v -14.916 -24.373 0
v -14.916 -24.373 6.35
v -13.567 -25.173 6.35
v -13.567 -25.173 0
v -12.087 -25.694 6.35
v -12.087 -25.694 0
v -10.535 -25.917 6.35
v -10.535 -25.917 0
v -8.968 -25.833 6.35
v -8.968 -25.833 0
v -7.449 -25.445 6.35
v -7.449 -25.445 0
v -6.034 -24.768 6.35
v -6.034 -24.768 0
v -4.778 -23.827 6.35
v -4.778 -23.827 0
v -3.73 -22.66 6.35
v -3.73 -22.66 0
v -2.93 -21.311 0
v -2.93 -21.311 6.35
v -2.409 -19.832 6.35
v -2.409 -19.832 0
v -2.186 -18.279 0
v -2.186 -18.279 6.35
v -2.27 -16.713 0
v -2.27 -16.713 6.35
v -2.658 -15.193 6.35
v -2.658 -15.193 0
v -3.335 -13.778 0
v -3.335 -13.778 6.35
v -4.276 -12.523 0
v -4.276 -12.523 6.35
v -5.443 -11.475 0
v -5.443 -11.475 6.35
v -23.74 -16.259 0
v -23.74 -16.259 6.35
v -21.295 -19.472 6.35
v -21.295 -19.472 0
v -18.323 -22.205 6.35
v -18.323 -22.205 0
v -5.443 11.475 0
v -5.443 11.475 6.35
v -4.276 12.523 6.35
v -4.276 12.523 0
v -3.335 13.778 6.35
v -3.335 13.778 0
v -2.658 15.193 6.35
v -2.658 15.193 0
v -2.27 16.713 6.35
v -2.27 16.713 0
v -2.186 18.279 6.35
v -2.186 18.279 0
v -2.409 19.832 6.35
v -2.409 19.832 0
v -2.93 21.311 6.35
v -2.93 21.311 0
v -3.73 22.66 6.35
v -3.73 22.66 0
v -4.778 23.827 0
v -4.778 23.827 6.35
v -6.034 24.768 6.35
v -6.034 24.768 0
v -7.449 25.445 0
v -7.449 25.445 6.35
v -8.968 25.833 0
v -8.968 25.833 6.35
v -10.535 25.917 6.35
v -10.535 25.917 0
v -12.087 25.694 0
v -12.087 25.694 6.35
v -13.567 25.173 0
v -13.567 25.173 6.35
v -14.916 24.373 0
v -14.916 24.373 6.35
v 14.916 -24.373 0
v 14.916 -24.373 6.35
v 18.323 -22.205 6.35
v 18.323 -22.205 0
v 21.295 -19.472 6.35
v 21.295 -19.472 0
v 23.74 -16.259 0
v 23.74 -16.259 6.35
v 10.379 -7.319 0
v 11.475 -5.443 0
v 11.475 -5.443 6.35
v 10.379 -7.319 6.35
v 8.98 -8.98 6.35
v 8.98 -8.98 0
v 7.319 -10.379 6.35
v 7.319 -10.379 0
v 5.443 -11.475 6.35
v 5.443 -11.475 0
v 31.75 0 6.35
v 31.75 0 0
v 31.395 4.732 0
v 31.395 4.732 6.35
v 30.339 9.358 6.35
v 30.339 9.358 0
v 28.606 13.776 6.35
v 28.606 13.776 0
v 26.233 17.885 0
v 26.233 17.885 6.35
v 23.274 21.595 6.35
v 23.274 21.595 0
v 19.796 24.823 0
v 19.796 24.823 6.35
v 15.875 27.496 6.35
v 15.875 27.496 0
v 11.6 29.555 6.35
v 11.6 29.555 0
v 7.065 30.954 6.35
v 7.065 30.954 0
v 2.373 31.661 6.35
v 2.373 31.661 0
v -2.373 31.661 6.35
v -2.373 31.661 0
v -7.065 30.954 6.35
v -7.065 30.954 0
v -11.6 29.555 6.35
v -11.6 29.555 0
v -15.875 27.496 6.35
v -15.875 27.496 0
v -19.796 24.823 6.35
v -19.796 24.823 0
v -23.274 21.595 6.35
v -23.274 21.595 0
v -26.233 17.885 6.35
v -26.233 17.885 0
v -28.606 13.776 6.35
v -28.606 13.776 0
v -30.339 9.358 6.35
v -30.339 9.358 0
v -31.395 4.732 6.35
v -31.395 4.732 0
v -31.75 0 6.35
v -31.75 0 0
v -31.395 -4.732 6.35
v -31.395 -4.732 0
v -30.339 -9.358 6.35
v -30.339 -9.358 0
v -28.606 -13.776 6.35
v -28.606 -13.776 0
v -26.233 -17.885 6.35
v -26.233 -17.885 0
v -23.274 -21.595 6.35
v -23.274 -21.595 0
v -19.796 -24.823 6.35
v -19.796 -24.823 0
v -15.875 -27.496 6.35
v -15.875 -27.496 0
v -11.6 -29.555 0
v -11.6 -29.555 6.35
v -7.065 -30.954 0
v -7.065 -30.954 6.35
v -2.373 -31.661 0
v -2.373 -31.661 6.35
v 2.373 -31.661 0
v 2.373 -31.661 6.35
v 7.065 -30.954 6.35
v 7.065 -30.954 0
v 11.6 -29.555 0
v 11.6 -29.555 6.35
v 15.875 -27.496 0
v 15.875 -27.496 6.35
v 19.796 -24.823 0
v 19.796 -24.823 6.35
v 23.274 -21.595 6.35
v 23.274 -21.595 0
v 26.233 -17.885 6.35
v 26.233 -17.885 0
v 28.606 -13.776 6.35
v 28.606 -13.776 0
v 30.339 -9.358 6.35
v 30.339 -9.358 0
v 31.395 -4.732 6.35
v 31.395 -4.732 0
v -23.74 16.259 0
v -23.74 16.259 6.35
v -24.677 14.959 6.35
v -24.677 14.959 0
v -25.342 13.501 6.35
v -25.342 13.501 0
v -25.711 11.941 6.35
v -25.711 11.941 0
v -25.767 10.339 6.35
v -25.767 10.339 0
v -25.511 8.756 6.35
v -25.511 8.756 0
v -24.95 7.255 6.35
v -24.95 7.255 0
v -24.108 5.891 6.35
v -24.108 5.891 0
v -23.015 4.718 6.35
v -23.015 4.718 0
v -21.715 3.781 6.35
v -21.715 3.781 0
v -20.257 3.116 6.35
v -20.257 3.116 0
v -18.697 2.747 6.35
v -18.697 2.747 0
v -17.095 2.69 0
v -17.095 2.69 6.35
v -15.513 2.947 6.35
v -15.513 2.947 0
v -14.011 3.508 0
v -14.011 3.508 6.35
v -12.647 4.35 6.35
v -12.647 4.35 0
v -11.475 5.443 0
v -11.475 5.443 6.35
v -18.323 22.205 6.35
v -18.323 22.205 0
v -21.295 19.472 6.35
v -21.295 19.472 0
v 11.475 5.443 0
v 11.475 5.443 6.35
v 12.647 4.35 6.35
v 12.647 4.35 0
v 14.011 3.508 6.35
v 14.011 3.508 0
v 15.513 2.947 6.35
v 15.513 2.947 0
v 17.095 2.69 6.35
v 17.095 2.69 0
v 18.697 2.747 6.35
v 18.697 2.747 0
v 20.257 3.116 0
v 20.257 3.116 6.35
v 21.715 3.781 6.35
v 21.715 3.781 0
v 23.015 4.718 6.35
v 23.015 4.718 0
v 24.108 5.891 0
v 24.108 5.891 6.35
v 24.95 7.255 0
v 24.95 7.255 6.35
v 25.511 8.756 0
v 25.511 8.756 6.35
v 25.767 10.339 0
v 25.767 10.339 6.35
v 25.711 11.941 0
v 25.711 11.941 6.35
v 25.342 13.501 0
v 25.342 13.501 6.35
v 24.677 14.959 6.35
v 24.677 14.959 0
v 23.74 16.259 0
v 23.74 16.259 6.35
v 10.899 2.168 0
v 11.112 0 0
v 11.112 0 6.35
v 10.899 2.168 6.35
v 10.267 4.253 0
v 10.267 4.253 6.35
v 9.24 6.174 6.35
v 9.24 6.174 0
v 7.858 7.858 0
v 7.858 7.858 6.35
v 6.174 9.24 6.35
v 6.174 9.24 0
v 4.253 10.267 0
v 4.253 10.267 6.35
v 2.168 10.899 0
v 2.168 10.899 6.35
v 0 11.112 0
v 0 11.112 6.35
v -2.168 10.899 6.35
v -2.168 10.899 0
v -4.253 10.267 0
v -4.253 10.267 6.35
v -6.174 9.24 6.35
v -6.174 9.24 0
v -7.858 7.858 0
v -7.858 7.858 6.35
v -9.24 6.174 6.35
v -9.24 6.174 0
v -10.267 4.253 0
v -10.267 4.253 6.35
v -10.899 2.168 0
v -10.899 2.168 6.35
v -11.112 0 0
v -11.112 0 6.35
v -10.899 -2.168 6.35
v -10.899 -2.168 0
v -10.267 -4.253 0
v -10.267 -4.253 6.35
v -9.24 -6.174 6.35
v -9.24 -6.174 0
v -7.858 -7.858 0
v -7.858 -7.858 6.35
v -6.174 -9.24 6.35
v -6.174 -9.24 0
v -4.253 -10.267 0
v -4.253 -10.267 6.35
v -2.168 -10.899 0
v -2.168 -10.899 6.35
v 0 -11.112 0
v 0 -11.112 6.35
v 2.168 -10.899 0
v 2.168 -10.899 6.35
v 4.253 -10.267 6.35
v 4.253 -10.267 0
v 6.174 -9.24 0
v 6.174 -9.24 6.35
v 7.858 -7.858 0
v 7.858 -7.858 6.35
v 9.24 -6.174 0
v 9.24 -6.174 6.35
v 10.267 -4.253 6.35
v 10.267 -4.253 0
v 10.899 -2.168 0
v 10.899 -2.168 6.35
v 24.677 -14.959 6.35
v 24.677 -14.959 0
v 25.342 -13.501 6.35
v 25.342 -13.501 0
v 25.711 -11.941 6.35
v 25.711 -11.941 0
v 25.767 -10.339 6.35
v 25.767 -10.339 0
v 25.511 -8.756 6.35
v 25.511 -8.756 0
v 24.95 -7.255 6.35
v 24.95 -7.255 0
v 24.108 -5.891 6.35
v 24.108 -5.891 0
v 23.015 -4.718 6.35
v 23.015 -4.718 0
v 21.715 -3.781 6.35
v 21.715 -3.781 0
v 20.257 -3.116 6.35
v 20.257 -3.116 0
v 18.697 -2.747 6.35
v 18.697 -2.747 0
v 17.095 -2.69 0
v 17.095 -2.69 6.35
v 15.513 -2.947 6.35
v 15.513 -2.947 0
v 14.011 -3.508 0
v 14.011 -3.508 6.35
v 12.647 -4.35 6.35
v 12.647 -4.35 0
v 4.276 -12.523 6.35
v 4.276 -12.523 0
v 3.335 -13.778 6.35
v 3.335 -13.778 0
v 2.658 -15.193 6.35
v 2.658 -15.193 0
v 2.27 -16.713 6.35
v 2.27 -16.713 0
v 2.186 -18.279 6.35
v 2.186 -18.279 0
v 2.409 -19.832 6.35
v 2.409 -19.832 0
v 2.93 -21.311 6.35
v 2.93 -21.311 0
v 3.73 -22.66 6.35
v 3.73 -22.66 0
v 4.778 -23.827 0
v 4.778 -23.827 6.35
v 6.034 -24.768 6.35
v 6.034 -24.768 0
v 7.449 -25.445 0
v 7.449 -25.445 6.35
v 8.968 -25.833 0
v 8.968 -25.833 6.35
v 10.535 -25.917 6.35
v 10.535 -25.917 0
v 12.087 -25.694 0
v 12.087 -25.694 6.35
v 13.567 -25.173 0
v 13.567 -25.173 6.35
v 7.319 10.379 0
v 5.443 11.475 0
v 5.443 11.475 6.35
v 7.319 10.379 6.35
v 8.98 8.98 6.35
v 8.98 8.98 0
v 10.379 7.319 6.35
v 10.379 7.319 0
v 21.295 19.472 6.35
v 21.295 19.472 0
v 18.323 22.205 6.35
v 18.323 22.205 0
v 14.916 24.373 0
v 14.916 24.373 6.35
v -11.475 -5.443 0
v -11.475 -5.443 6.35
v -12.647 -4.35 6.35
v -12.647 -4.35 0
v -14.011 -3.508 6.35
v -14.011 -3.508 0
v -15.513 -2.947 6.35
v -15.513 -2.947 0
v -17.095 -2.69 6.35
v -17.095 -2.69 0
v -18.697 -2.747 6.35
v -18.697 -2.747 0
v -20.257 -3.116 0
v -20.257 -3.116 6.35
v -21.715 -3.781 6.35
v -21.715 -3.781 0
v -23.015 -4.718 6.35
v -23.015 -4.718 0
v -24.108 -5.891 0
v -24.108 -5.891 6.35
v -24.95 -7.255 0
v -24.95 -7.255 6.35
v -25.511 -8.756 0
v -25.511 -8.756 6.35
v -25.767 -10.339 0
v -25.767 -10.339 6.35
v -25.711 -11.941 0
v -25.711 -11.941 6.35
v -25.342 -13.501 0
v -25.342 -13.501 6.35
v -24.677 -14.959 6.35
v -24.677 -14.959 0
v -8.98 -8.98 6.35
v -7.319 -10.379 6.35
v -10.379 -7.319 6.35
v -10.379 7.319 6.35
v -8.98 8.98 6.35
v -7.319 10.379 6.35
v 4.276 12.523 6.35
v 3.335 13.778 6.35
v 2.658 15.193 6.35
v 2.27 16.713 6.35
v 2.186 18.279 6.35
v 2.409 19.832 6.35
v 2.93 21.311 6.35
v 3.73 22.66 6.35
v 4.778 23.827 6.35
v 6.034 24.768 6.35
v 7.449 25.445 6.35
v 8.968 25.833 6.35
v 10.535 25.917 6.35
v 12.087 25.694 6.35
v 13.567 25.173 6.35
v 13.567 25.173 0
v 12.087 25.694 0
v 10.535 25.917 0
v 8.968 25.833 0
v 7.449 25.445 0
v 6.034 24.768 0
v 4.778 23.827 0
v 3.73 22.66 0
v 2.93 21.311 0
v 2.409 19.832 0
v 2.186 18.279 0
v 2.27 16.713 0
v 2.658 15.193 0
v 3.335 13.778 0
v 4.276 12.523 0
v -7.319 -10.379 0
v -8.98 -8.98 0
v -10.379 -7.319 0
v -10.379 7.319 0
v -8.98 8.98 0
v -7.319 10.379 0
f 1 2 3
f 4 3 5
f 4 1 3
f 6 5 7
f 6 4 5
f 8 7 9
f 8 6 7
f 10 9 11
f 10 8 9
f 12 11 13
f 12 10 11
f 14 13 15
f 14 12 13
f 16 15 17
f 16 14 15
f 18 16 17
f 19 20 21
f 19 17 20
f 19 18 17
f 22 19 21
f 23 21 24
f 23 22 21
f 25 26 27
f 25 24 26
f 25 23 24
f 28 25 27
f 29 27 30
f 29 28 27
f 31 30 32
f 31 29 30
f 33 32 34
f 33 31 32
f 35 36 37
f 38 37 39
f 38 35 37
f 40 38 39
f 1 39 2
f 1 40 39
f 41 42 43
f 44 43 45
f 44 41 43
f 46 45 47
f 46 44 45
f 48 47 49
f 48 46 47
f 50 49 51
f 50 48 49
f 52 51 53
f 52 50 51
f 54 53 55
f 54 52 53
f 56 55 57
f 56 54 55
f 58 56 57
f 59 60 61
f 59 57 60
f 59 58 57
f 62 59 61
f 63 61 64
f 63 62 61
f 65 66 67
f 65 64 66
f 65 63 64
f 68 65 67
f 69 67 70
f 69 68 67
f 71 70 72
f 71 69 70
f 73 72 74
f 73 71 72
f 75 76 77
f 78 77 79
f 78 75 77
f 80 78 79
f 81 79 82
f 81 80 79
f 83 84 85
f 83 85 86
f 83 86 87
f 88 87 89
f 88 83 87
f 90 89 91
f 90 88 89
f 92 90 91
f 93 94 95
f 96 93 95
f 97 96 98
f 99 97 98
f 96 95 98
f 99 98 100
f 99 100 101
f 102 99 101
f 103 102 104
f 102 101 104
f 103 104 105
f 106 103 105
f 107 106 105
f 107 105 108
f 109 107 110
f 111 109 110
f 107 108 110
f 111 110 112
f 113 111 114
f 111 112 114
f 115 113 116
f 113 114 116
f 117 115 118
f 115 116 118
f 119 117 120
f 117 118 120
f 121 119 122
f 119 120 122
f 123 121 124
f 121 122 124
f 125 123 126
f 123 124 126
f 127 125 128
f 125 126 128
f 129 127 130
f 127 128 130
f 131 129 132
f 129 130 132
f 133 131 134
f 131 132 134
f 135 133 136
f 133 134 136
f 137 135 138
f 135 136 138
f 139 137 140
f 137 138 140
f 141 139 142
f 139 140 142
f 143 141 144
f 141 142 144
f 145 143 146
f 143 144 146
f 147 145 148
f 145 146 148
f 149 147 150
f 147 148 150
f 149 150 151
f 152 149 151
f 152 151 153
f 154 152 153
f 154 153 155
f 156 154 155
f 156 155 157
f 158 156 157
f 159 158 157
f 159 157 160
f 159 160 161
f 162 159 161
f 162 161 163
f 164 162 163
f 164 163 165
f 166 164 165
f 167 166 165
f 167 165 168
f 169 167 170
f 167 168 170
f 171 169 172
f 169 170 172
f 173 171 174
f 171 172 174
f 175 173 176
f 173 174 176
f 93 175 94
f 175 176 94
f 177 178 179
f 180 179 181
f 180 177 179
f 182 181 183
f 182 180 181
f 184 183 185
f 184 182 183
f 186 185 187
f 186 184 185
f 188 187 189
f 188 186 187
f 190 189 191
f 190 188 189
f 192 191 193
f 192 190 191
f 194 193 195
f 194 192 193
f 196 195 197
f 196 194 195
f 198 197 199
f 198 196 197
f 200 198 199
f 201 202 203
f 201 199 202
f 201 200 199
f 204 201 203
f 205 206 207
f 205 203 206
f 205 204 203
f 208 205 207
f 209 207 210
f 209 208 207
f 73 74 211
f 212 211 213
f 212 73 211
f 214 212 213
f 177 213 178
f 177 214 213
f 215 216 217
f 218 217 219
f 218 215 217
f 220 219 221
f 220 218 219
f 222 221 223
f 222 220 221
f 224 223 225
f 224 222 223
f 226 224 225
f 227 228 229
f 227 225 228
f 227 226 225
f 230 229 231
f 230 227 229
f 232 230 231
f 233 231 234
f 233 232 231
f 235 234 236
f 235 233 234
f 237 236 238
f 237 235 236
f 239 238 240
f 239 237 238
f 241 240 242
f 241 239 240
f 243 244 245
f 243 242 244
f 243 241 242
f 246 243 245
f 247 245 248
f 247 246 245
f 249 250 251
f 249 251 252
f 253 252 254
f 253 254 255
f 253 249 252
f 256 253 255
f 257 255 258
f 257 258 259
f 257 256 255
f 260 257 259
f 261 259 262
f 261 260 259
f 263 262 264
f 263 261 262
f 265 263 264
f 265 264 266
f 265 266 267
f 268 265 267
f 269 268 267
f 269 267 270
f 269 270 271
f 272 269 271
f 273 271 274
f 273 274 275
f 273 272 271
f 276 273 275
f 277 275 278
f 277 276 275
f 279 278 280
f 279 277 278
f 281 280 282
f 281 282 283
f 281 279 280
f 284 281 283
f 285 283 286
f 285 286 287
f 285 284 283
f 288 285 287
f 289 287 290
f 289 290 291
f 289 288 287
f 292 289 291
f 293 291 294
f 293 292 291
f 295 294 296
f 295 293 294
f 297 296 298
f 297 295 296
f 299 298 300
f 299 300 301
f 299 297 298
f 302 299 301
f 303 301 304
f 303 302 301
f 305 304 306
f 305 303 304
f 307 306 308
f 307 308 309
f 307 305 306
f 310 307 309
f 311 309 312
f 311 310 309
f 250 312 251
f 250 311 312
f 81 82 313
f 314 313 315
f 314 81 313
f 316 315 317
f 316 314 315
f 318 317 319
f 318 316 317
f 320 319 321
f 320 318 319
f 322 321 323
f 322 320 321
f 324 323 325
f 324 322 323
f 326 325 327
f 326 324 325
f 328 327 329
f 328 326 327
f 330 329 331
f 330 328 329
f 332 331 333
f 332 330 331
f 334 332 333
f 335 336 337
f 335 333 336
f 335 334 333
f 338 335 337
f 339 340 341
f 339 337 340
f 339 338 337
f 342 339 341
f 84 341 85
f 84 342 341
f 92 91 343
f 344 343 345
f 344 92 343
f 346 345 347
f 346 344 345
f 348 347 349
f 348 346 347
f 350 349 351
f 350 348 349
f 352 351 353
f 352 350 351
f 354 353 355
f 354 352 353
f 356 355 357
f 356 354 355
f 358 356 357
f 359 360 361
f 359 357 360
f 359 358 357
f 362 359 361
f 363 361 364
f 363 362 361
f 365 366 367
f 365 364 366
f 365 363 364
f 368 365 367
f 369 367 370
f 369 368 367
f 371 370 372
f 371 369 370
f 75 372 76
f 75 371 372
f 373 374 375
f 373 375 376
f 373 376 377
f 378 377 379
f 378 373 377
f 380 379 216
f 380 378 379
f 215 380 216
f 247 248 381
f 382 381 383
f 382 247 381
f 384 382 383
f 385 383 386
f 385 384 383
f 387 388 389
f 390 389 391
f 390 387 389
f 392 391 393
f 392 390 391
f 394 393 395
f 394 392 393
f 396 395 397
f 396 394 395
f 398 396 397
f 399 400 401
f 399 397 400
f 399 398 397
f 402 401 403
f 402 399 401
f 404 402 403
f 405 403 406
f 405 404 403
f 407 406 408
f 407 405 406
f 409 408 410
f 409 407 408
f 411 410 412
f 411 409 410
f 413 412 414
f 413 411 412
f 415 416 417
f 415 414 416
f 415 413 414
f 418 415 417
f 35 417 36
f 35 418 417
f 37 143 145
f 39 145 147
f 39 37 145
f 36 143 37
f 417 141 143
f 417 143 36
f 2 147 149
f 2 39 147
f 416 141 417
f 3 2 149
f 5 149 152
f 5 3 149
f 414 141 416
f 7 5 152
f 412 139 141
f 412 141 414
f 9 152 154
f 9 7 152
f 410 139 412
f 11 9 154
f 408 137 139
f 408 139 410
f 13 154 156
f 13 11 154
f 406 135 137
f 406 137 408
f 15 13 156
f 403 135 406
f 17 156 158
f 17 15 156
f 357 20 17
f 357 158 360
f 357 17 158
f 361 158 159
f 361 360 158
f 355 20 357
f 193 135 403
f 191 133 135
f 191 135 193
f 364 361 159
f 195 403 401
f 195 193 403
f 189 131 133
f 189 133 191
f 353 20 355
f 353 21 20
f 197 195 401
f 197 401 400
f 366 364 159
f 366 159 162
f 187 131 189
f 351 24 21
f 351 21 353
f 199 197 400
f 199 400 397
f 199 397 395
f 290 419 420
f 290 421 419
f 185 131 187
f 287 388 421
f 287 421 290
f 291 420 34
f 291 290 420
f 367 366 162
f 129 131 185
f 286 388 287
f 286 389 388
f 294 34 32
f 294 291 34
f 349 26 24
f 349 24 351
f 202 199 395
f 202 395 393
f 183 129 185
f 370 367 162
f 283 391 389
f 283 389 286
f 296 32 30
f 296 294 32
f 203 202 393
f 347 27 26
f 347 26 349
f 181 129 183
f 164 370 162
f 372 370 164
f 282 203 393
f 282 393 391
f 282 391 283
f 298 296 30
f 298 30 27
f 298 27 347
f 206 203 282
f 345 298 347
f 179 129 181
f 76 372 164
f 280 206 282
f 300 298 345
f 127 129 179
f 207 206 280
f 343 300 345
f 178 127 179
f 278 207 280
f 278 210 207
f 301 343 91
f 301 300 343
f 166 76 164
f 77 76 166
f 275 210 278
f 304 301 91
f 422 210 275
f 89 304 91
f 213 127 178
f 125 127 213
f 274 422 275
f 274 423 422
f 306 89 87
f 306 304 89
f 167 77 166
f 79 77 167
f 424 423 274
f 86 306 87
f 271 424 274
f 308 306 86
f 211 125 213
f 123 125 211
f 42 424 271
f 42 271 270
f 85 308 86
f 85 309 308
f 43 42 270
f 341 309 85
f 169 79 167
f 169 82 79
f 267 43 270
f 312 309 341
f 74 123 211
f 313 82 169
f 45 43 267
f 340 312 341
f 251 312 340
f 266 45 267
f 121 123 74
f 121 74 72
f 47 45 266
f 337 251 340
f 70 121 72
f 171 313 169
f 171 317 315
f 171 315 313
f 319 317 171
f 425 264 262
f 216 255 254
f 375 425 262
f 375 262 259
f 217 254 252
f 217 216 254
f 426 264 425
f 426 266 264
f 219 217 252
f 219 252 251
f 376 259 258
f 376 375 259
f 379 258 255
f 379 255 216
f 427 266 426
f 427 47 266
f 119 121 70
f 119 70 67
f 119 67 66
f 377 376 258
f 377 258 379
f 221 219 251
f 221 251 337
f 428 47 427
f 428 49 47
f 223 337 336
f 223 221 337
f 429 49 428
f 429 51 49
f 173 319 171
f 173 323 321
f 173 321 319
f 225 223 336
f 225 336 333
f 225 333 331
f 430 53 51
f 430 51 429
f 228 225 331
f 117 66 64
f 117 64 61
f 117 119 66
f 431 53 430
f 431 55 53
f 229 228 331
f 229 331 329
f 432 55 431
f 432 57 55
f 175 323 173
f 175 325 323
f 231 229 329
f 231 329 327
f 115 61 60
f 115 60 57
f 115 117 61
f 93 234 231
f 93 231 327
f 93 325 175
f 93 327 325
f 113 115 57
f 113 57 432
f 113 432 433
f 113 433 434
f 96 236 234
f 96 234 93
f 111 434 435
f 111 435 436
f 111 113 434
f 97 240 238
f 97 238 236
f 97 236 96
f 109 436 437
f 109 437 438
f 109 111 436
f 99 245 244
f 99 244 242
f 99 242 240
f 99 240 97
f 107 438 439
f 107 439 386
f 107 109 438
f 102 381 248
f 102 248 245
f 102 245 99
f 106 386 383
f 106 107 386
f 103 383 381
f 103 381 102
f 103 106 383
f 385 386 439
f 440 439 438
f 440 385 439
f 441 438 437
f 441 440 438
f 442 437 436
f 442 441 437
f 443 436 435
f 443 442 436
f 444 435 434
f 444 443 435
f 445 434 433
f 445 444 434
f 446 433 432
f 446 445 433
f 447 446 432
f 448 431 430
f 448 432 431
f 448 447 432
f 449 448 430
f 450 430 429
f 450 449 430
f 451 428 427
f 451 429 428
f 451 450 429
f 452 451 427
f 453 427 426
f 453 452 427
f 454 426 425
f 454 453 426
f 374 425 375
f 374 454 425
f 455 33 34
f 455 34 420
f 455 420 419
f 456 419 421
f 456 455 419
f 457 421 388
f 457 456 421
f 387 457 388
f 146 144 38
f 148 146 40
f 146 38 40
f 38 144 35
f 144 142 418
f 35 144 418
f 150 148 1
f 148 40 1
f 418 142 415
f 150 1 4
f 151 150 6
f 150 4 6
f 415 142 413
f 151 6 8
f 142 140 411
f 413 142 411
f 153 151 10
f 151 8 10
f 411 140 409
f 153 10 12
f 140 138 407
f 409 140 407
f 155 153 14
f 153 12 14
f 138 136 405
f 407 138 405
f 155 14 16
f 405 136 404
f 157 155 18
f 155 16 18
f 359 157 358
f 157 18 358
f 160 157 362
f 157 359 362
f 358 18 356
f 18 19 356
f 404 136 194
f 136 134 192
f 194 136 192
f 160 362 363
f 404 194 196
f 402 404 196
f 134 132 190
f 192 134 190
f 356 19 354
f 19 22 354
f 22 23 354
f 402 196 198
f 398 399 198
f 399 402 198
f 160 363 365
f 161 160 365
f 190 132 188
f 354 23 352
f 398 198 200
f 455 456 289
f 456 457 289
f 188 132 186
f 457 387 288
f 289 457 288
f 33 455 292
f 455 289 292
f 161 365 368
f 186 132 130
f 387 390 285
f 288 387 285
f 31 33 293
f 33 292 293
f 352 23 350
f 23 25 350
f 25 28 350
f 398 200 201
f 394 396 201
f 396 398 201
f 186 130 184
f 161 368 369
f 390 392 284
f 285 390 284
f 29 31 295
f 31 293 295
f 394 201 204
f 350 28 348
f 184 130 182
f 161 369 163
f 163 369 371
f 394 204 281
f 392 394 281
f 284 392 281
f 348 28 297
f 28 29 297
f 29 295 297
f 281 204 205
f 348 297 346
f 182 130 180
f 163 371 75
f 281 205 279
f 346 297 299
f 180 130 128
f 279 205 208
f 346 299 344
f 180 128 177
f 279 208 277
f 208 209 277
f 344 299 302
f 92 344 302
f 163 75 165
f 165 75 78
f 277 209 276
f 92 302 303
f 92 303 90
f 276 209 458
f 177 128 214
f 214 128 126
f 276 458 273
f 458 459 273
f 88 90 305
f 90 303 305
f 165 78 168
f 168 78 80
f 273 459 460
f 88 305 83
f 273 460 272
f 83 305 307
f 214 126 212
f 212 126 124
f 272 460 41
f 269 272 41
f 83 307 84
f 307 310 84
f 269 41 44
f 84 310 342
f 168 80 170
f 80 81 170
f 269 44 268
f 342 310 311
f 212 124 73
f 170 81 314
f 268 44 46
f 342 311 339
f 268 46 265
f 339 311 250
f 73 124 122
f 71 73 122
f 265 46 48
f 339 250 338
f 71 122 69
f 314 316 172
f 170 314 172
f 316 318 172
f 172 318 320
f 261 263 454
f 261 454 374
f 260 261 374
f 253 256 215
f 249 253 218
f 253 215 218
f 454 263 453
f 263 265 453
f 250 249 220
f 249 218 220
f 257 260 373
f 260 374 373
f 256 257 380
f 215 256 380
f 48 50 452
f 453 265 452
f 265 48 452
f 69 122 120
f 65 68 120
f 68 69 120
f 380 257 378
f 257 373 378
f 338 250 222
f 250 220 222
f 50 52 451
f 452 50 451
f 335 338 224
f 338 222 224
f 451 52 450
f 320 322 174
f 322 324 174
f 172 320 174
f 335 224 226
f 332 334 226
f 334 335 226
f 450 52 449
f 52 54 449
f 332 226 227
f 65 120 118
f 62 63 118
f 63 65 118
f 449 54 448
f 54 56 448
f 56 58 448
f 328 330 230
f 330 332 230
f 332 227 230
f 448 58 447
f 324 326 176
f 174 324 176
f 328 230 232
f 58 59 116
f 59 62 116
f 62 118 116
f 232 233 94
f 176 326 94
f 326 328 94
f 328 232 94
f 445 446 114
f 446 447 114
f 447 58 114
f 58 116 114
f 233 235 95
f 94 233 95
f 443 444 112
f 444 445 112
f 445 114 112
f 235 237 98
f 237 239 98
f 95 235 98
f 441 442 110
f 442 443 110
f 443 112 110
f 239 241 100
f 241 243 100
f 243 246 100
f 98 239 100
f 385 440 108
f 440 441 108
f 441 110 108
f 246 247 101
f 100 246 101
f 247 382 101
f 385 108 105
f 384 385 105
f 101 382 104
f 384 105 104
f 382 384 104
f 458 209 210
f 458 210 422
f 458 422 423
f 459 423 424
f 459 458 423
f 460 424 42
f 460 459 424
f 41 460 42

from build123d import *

# Parameters (mm, degrees)
F0_R     = 31.75
F0_R_2   = 11.1125
F1_DEPTH = 6.35
F3_DEPTH = 6.351


with BuildPart() as f1:
    # F0 (on Top) → F1 (new body)
    with BuildSketch(Plane.XY):
        Circle(F0_R)
        Circle(F0_R_2, mode=Mode.SUBTRACT)
    extrude(amount=F1_DEPTH)

    # F2 (on Top) → F3 (cut, through all)
    with BuildSketch(Plane.XY):
        with BuildLine():
            ThreePointArc((23.73958, 16.258981), (19.869054, 20.904466), (14.915959, 24.372658))
            ThreePointArc((14.915959, 24.372658), (3.730354, 22.660155), (5.442857, 11.47455))
            ThreePointArc((5.442857, 11.47455), (8.980256, 8.980256), (11.47455, 5.442857))
            ThreePointArc((11.47455, 5.442857), (23.015127, 4.718404), (23.73958, 16.258981))
        make_face()
        with BuildLine():
            ThreePointArc((14.915959, -24.372658), (19.869054, -20.904466), (23.73958, -16.258981))
            ThreePointArc((23.73958, -16.258981), (23.015127, -4.718404), (11.47455, -5.442857))
            ThreePointArc((11.47455, -5.442857), (8.980256, -8.980256), (5.442857, -11.47455))
            ThreePointArc((5.442857, -11.47455), (3.730354, -22.660155), (14.915959, -24.372658))
        make_face()
        with BuildLine():
            ThreePointArc((-5.442857, 11.47455), (-3.730354, 22.660155), (-14.915959, 24.372658))
            ThreePointArc((-14.915959, 24.372658), (-19.869054, 20.904466), (-23.73958, 16.258981))
            ThreePointArc((-23.73958, 16.258981), (-23.015127, 4.718404), (-11.47455, 5.442857))
            ThreePointArc((-11.47455, 5.442857), (-8.980256, 8.980256), (-5.442857, 11.47455))
        make_face()
        with BuildLine():
            ThreePointArc((-5.442857, -11.47455), (-8.980256, -8.980256), (-11.47455, -5.442857))
            ThreePointArc((-11.47455, -5.442857), (-23.015127, -4.718404), (-23.73958, -16.258981))
            ThreePointArc((-23.73958, -16.258981), (-19.869054, -20.904466), (-14.915959, -24.372658))
            ThreePointArc((-14.915959, -24.372658), (-3.730354, -22.660155), (-5.442857, -11.47455))
        make_face()
    extrude(amount=F3_DEPTH, mode=Mode.SUBTRACT)


solid = f1.part
